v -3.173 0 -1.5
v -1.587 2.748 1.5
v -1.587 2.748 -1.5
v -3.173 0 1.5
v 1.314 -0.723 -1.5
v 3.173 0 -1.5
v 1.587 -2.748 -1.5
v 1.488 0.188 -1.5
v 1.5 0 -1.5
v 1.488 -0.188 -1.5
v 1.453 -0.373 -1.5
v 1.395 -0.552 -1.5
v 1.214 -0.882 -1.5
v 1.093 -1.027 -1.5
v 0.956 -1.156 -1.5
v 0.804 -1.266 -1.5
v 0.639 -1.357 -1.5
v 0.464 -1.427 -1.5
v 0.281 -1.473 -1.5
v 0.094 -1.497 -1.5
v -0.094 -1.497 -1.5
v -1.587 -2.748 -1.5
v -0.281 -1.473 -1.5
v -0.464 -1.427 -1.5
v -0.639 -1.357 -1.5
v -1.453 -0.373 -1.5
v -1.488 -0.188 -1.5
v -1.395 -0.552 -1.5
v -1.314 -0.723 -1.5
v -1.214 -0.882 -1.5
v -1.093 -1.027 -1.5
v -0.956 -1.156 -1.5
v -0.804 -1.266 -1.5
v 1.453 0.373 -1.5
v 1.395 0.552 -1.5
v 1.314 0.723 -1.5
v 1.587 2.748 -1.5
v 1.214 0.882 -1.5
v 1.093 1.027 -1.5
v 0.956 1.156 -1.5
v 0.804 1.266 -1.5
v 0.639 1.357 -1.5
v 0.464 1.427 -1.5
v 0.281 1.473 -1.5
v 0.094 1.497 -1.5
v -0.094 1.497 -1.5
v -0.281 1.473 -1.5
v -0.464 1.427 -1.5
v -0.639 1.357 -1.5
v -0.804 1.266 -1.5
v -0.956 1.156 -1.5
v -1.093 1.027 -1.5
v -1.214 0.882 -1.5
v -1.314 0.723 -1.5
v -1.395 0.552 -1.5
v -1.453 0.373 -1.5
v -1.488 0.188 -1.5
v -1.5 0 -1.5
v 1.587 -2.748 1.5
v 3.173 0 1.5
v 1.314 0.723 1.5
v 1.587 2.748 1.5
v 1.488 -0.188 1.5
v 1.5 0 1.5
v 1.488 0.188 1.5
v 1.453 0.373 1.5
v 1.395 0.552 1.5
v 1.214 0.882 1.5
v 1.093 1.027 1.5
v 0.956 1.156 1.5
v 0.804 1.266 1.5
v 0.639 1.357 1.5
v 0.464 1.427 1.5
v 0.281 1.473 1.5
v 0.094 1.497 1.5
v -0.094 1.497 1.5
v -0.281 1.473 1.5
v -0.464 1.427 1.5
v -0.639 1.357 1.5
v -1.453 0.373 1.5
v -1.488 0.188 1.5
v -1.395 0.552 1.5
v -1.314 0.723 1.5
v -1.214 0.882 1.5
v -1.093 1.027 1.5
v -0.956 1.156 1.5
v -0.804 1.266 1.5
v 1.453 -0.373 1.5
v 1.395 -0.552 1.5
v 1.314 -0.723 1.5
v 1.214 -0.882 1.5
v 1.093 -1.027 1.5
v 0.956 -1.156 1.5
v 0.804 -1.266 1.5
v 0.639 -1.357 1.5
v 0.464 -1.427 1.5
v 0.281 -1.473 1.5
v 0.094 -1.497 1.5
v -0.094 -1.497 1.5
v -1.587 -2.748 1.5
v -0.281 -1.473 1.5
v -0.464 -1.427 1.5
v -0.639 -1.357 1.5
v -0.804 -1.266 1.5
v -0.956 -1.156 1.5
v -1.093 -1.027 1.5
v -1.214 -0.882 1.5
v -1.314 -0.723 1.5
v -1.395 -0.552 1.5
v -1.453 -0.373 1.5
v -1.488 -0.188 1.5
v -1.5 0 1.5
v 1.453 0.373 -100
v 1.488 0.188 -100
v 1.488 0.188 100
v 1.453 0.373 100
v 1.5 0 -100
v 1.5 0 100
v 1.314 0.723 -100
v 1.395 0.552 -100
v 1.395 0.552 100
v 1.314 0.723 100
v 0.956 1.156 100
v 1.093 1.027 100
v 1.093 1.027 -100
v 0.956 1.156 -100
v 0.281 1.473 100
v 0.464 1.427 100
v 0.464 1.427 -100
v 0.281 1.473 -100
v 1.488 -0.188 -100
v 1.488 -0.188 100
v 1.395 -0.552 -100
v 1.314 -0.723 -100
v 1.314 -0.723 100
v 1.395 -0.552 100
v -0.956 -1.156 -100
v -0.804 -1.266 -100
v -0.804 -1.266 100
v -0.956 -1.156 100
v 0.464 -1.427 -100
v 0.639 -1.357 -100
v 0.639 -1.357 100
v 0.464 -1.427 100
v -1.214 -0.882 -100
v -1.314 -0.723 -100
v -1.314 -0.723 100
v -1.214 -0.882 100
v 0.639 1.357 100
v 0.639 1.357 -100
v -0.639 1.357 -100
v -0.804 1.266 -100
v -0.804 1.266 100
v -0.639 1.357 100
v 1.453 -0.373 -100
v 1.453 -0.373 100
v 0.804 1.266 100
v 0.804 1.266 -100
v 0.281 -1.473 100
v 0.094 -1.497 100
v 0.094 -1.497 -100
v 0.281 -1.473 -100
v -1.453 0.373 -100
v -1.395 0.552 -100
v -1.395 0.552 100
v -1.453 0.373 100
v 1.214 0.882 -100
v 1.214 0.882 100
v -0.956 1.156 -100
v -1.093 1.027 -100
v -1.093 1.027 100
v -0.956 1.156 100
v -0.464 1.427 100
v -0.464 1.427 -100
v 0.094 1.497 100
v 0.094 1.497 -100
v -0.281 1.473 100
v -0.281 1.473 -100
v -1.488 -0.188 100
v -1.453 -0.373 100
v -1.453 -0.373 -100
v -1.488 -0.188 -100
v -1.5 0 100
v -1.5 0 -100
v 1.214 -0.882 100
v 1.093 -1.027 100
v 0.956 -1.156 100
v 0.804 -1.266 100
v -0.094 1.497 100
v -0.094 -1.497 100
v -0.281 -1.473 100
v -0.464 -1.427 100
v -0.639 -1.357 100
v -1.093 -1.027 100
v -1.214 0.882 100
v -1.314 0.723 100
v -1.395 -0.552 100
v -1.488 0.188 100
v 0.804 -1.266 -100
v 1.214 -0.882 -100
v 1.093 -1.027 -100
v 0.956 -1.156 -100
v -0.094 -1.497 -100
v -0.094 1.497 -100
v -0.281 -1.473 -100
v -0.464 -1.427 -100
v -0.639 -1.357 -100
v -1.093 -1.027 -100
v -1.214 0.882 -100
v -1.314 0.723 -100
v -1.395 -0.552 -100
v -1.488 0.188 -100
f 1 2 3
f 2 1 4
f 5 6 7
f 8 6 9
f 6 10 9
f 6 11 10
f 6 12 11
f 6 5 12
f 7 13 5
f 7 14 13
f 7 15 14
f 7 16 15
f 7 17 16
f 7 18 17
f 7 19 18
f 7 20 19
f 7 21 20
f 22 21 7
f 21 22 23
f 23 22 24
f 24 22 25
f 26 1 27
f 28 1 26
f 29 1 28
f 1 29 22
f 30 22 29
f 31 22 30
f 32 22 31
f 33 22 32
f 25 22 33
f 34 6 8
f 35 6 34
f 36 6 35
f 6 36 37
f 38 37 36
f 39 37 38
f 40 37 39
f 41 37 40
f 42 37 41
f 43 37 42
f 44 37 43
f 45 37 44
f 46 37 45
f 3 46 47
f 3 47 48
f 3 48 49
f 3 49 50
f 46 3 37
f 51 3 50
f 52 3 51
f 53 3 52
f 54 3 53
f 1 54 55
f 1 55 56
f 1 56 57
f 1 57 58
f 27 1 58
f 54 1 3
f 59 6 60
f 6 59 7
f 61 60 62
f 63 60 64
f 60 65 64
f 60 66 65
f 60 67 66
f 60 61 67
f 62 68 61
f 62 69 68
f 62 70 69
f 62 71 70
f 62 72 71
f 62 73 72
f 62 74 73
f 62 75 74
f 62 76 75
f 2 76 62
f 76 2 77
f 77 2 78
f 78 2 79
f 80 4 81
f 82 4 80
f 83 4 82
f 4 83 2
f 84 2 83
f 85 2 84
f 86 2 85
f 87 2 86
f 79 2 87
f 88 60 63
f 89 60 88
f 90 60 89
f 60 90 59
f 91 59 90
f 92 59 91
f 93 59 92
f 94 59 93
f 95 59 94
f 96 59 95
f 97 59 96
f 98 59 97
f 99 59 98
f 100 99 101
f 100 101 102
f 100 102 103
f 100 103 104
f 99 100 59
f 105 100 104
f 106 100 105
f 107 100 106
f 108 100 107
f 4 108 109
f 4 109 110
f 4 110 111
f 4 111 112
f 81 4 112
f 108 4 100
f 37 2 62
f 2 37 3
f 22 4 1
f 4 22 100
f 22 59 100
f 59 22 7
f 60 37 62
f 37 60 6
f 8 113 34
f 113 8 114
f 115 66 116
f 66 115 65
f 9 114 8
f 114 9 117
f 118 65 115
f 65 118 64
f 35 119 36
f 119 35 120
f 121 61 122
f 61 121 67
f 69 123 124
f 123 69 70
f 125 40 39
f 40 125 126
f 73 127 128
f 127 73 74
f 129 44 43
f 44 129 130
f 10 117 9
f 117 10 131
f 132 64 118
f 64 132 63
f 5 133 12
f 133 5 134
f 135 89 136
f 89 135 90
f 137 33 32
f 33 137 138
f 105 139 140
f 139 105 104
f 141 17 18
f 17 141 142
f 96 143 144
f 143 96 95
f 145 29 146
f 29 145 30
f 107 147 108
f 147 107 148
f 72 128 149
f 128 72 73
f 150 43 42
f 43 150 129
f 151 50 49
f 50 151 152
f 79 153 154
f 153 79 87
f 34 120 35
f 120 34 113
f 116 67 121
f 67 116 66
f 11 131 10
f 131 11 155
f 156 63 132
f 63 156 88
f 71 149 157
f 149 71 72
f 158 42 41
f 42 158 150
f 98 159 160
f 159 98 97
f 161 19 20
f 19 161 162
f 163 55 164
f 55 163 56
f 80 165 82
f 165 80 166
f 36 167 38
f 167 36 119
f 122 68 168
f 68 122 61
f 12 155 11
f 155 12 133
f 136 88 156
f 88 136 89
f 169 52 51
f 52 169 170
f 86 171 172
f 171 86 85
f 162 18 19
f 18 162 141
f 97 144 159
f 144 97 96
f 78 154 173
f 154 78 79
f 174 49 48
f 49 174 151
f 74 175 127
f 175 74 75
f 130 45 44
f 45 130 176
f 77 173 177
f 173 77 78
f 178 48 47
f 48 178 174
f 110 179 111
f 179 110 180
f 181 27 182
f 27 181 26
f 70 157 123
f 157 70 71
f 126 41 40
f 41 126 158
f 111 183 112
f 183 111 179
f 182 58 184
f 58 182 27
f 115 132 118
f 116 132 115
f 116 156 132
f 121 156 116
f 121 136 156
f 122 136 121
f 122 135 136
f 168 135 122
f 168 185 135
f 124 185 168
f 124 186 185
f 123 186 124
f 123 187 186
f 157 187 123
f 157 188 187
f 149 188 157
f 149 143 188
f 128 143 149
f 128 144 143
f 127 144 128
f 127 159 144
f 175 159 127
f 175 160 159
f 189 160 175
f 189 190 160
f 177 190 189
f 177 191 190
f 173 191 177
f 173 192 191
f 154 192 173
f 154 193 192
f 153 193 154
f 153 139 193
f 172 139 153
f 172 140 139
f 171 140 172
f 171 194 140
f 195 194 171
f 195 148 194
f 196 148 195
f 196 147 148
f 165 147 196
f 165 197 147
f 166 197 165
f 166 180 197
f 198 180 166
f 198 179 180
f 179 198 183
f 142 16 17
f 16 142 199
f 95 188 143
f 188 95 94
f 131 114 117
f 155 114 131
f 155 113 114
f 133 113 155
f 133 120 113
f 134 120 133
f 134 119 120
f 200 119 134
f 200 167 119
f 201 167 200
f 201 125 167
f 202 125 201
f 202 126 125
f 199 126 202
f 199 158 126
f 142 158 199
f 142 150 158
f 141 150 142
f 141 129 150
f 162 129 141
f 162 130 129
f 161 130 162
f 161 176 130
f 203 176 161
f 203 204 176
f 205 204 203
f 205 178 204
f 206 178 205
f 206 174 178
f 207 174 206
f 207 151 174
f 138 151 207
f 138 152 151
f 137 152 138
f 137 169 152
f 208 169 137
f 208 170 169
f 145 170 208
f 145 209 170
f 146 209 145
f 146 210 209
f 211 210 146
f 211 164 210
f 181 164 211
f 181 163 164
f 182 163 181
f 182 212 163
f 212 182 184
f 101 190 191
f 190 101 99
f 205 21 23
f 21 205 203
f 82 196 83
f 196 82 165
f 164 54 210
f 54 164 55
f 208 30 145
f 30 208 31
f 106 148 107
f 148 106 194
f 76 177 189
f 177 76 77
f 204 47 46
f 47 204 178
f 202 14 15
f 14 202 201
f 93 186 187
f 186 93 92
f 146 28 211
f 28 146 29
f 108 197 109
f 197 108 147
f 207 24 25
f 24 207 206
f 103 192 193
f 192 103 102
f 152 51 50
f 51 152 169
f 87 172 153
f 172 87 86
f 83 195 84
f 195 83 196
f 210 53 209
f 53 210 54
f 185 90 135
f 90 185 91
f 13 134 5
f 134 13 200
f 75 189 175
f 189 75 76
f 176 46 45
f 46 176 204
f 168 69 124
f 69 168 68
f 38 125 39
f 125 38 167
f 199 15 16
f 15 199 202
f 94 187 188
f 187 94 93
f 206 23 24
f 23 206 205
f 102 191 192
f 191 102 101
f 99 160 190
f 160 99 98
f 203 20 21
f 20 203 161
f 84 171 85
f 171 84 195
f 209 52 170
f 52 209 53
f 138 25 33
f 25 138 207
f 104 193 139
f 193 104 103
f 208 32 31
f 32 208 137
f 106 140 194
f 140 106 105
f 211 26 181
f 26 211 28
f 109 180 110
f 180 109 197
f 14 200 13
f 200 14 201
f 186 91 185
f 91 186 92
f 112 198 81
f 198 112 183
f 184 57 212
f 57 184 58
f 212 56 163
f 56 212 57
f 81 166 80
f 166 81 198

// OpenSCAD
$fn = 50;

difference() {
	union() {
		translate(v = [0, 0, 0]) {
			rotate(a = [0, 0, 0]) {
				difference() {
					union() {
						translate(v = [0, 0, -1.5]) {
							linear_extrude(height = 3) {
								polygon(points = [[3.1734999999999998, 0.0], [1.5867500000000003, 2.7483316189099156], [-1.5867499999999992, 2.748331618909916], [-3.1734999999999998, 3.886416617094125e-16], [-1.5867500000000012, -2.748331618909915], [1.5867499999999977, -2.748331618909917]]);
							}
						}
						translate(v = [0, 0, -100.0]) {
							cylinder(h = 200, r = 1.5);
						}
					}
					union();
				}
			}
		}
	}
	union();
}
